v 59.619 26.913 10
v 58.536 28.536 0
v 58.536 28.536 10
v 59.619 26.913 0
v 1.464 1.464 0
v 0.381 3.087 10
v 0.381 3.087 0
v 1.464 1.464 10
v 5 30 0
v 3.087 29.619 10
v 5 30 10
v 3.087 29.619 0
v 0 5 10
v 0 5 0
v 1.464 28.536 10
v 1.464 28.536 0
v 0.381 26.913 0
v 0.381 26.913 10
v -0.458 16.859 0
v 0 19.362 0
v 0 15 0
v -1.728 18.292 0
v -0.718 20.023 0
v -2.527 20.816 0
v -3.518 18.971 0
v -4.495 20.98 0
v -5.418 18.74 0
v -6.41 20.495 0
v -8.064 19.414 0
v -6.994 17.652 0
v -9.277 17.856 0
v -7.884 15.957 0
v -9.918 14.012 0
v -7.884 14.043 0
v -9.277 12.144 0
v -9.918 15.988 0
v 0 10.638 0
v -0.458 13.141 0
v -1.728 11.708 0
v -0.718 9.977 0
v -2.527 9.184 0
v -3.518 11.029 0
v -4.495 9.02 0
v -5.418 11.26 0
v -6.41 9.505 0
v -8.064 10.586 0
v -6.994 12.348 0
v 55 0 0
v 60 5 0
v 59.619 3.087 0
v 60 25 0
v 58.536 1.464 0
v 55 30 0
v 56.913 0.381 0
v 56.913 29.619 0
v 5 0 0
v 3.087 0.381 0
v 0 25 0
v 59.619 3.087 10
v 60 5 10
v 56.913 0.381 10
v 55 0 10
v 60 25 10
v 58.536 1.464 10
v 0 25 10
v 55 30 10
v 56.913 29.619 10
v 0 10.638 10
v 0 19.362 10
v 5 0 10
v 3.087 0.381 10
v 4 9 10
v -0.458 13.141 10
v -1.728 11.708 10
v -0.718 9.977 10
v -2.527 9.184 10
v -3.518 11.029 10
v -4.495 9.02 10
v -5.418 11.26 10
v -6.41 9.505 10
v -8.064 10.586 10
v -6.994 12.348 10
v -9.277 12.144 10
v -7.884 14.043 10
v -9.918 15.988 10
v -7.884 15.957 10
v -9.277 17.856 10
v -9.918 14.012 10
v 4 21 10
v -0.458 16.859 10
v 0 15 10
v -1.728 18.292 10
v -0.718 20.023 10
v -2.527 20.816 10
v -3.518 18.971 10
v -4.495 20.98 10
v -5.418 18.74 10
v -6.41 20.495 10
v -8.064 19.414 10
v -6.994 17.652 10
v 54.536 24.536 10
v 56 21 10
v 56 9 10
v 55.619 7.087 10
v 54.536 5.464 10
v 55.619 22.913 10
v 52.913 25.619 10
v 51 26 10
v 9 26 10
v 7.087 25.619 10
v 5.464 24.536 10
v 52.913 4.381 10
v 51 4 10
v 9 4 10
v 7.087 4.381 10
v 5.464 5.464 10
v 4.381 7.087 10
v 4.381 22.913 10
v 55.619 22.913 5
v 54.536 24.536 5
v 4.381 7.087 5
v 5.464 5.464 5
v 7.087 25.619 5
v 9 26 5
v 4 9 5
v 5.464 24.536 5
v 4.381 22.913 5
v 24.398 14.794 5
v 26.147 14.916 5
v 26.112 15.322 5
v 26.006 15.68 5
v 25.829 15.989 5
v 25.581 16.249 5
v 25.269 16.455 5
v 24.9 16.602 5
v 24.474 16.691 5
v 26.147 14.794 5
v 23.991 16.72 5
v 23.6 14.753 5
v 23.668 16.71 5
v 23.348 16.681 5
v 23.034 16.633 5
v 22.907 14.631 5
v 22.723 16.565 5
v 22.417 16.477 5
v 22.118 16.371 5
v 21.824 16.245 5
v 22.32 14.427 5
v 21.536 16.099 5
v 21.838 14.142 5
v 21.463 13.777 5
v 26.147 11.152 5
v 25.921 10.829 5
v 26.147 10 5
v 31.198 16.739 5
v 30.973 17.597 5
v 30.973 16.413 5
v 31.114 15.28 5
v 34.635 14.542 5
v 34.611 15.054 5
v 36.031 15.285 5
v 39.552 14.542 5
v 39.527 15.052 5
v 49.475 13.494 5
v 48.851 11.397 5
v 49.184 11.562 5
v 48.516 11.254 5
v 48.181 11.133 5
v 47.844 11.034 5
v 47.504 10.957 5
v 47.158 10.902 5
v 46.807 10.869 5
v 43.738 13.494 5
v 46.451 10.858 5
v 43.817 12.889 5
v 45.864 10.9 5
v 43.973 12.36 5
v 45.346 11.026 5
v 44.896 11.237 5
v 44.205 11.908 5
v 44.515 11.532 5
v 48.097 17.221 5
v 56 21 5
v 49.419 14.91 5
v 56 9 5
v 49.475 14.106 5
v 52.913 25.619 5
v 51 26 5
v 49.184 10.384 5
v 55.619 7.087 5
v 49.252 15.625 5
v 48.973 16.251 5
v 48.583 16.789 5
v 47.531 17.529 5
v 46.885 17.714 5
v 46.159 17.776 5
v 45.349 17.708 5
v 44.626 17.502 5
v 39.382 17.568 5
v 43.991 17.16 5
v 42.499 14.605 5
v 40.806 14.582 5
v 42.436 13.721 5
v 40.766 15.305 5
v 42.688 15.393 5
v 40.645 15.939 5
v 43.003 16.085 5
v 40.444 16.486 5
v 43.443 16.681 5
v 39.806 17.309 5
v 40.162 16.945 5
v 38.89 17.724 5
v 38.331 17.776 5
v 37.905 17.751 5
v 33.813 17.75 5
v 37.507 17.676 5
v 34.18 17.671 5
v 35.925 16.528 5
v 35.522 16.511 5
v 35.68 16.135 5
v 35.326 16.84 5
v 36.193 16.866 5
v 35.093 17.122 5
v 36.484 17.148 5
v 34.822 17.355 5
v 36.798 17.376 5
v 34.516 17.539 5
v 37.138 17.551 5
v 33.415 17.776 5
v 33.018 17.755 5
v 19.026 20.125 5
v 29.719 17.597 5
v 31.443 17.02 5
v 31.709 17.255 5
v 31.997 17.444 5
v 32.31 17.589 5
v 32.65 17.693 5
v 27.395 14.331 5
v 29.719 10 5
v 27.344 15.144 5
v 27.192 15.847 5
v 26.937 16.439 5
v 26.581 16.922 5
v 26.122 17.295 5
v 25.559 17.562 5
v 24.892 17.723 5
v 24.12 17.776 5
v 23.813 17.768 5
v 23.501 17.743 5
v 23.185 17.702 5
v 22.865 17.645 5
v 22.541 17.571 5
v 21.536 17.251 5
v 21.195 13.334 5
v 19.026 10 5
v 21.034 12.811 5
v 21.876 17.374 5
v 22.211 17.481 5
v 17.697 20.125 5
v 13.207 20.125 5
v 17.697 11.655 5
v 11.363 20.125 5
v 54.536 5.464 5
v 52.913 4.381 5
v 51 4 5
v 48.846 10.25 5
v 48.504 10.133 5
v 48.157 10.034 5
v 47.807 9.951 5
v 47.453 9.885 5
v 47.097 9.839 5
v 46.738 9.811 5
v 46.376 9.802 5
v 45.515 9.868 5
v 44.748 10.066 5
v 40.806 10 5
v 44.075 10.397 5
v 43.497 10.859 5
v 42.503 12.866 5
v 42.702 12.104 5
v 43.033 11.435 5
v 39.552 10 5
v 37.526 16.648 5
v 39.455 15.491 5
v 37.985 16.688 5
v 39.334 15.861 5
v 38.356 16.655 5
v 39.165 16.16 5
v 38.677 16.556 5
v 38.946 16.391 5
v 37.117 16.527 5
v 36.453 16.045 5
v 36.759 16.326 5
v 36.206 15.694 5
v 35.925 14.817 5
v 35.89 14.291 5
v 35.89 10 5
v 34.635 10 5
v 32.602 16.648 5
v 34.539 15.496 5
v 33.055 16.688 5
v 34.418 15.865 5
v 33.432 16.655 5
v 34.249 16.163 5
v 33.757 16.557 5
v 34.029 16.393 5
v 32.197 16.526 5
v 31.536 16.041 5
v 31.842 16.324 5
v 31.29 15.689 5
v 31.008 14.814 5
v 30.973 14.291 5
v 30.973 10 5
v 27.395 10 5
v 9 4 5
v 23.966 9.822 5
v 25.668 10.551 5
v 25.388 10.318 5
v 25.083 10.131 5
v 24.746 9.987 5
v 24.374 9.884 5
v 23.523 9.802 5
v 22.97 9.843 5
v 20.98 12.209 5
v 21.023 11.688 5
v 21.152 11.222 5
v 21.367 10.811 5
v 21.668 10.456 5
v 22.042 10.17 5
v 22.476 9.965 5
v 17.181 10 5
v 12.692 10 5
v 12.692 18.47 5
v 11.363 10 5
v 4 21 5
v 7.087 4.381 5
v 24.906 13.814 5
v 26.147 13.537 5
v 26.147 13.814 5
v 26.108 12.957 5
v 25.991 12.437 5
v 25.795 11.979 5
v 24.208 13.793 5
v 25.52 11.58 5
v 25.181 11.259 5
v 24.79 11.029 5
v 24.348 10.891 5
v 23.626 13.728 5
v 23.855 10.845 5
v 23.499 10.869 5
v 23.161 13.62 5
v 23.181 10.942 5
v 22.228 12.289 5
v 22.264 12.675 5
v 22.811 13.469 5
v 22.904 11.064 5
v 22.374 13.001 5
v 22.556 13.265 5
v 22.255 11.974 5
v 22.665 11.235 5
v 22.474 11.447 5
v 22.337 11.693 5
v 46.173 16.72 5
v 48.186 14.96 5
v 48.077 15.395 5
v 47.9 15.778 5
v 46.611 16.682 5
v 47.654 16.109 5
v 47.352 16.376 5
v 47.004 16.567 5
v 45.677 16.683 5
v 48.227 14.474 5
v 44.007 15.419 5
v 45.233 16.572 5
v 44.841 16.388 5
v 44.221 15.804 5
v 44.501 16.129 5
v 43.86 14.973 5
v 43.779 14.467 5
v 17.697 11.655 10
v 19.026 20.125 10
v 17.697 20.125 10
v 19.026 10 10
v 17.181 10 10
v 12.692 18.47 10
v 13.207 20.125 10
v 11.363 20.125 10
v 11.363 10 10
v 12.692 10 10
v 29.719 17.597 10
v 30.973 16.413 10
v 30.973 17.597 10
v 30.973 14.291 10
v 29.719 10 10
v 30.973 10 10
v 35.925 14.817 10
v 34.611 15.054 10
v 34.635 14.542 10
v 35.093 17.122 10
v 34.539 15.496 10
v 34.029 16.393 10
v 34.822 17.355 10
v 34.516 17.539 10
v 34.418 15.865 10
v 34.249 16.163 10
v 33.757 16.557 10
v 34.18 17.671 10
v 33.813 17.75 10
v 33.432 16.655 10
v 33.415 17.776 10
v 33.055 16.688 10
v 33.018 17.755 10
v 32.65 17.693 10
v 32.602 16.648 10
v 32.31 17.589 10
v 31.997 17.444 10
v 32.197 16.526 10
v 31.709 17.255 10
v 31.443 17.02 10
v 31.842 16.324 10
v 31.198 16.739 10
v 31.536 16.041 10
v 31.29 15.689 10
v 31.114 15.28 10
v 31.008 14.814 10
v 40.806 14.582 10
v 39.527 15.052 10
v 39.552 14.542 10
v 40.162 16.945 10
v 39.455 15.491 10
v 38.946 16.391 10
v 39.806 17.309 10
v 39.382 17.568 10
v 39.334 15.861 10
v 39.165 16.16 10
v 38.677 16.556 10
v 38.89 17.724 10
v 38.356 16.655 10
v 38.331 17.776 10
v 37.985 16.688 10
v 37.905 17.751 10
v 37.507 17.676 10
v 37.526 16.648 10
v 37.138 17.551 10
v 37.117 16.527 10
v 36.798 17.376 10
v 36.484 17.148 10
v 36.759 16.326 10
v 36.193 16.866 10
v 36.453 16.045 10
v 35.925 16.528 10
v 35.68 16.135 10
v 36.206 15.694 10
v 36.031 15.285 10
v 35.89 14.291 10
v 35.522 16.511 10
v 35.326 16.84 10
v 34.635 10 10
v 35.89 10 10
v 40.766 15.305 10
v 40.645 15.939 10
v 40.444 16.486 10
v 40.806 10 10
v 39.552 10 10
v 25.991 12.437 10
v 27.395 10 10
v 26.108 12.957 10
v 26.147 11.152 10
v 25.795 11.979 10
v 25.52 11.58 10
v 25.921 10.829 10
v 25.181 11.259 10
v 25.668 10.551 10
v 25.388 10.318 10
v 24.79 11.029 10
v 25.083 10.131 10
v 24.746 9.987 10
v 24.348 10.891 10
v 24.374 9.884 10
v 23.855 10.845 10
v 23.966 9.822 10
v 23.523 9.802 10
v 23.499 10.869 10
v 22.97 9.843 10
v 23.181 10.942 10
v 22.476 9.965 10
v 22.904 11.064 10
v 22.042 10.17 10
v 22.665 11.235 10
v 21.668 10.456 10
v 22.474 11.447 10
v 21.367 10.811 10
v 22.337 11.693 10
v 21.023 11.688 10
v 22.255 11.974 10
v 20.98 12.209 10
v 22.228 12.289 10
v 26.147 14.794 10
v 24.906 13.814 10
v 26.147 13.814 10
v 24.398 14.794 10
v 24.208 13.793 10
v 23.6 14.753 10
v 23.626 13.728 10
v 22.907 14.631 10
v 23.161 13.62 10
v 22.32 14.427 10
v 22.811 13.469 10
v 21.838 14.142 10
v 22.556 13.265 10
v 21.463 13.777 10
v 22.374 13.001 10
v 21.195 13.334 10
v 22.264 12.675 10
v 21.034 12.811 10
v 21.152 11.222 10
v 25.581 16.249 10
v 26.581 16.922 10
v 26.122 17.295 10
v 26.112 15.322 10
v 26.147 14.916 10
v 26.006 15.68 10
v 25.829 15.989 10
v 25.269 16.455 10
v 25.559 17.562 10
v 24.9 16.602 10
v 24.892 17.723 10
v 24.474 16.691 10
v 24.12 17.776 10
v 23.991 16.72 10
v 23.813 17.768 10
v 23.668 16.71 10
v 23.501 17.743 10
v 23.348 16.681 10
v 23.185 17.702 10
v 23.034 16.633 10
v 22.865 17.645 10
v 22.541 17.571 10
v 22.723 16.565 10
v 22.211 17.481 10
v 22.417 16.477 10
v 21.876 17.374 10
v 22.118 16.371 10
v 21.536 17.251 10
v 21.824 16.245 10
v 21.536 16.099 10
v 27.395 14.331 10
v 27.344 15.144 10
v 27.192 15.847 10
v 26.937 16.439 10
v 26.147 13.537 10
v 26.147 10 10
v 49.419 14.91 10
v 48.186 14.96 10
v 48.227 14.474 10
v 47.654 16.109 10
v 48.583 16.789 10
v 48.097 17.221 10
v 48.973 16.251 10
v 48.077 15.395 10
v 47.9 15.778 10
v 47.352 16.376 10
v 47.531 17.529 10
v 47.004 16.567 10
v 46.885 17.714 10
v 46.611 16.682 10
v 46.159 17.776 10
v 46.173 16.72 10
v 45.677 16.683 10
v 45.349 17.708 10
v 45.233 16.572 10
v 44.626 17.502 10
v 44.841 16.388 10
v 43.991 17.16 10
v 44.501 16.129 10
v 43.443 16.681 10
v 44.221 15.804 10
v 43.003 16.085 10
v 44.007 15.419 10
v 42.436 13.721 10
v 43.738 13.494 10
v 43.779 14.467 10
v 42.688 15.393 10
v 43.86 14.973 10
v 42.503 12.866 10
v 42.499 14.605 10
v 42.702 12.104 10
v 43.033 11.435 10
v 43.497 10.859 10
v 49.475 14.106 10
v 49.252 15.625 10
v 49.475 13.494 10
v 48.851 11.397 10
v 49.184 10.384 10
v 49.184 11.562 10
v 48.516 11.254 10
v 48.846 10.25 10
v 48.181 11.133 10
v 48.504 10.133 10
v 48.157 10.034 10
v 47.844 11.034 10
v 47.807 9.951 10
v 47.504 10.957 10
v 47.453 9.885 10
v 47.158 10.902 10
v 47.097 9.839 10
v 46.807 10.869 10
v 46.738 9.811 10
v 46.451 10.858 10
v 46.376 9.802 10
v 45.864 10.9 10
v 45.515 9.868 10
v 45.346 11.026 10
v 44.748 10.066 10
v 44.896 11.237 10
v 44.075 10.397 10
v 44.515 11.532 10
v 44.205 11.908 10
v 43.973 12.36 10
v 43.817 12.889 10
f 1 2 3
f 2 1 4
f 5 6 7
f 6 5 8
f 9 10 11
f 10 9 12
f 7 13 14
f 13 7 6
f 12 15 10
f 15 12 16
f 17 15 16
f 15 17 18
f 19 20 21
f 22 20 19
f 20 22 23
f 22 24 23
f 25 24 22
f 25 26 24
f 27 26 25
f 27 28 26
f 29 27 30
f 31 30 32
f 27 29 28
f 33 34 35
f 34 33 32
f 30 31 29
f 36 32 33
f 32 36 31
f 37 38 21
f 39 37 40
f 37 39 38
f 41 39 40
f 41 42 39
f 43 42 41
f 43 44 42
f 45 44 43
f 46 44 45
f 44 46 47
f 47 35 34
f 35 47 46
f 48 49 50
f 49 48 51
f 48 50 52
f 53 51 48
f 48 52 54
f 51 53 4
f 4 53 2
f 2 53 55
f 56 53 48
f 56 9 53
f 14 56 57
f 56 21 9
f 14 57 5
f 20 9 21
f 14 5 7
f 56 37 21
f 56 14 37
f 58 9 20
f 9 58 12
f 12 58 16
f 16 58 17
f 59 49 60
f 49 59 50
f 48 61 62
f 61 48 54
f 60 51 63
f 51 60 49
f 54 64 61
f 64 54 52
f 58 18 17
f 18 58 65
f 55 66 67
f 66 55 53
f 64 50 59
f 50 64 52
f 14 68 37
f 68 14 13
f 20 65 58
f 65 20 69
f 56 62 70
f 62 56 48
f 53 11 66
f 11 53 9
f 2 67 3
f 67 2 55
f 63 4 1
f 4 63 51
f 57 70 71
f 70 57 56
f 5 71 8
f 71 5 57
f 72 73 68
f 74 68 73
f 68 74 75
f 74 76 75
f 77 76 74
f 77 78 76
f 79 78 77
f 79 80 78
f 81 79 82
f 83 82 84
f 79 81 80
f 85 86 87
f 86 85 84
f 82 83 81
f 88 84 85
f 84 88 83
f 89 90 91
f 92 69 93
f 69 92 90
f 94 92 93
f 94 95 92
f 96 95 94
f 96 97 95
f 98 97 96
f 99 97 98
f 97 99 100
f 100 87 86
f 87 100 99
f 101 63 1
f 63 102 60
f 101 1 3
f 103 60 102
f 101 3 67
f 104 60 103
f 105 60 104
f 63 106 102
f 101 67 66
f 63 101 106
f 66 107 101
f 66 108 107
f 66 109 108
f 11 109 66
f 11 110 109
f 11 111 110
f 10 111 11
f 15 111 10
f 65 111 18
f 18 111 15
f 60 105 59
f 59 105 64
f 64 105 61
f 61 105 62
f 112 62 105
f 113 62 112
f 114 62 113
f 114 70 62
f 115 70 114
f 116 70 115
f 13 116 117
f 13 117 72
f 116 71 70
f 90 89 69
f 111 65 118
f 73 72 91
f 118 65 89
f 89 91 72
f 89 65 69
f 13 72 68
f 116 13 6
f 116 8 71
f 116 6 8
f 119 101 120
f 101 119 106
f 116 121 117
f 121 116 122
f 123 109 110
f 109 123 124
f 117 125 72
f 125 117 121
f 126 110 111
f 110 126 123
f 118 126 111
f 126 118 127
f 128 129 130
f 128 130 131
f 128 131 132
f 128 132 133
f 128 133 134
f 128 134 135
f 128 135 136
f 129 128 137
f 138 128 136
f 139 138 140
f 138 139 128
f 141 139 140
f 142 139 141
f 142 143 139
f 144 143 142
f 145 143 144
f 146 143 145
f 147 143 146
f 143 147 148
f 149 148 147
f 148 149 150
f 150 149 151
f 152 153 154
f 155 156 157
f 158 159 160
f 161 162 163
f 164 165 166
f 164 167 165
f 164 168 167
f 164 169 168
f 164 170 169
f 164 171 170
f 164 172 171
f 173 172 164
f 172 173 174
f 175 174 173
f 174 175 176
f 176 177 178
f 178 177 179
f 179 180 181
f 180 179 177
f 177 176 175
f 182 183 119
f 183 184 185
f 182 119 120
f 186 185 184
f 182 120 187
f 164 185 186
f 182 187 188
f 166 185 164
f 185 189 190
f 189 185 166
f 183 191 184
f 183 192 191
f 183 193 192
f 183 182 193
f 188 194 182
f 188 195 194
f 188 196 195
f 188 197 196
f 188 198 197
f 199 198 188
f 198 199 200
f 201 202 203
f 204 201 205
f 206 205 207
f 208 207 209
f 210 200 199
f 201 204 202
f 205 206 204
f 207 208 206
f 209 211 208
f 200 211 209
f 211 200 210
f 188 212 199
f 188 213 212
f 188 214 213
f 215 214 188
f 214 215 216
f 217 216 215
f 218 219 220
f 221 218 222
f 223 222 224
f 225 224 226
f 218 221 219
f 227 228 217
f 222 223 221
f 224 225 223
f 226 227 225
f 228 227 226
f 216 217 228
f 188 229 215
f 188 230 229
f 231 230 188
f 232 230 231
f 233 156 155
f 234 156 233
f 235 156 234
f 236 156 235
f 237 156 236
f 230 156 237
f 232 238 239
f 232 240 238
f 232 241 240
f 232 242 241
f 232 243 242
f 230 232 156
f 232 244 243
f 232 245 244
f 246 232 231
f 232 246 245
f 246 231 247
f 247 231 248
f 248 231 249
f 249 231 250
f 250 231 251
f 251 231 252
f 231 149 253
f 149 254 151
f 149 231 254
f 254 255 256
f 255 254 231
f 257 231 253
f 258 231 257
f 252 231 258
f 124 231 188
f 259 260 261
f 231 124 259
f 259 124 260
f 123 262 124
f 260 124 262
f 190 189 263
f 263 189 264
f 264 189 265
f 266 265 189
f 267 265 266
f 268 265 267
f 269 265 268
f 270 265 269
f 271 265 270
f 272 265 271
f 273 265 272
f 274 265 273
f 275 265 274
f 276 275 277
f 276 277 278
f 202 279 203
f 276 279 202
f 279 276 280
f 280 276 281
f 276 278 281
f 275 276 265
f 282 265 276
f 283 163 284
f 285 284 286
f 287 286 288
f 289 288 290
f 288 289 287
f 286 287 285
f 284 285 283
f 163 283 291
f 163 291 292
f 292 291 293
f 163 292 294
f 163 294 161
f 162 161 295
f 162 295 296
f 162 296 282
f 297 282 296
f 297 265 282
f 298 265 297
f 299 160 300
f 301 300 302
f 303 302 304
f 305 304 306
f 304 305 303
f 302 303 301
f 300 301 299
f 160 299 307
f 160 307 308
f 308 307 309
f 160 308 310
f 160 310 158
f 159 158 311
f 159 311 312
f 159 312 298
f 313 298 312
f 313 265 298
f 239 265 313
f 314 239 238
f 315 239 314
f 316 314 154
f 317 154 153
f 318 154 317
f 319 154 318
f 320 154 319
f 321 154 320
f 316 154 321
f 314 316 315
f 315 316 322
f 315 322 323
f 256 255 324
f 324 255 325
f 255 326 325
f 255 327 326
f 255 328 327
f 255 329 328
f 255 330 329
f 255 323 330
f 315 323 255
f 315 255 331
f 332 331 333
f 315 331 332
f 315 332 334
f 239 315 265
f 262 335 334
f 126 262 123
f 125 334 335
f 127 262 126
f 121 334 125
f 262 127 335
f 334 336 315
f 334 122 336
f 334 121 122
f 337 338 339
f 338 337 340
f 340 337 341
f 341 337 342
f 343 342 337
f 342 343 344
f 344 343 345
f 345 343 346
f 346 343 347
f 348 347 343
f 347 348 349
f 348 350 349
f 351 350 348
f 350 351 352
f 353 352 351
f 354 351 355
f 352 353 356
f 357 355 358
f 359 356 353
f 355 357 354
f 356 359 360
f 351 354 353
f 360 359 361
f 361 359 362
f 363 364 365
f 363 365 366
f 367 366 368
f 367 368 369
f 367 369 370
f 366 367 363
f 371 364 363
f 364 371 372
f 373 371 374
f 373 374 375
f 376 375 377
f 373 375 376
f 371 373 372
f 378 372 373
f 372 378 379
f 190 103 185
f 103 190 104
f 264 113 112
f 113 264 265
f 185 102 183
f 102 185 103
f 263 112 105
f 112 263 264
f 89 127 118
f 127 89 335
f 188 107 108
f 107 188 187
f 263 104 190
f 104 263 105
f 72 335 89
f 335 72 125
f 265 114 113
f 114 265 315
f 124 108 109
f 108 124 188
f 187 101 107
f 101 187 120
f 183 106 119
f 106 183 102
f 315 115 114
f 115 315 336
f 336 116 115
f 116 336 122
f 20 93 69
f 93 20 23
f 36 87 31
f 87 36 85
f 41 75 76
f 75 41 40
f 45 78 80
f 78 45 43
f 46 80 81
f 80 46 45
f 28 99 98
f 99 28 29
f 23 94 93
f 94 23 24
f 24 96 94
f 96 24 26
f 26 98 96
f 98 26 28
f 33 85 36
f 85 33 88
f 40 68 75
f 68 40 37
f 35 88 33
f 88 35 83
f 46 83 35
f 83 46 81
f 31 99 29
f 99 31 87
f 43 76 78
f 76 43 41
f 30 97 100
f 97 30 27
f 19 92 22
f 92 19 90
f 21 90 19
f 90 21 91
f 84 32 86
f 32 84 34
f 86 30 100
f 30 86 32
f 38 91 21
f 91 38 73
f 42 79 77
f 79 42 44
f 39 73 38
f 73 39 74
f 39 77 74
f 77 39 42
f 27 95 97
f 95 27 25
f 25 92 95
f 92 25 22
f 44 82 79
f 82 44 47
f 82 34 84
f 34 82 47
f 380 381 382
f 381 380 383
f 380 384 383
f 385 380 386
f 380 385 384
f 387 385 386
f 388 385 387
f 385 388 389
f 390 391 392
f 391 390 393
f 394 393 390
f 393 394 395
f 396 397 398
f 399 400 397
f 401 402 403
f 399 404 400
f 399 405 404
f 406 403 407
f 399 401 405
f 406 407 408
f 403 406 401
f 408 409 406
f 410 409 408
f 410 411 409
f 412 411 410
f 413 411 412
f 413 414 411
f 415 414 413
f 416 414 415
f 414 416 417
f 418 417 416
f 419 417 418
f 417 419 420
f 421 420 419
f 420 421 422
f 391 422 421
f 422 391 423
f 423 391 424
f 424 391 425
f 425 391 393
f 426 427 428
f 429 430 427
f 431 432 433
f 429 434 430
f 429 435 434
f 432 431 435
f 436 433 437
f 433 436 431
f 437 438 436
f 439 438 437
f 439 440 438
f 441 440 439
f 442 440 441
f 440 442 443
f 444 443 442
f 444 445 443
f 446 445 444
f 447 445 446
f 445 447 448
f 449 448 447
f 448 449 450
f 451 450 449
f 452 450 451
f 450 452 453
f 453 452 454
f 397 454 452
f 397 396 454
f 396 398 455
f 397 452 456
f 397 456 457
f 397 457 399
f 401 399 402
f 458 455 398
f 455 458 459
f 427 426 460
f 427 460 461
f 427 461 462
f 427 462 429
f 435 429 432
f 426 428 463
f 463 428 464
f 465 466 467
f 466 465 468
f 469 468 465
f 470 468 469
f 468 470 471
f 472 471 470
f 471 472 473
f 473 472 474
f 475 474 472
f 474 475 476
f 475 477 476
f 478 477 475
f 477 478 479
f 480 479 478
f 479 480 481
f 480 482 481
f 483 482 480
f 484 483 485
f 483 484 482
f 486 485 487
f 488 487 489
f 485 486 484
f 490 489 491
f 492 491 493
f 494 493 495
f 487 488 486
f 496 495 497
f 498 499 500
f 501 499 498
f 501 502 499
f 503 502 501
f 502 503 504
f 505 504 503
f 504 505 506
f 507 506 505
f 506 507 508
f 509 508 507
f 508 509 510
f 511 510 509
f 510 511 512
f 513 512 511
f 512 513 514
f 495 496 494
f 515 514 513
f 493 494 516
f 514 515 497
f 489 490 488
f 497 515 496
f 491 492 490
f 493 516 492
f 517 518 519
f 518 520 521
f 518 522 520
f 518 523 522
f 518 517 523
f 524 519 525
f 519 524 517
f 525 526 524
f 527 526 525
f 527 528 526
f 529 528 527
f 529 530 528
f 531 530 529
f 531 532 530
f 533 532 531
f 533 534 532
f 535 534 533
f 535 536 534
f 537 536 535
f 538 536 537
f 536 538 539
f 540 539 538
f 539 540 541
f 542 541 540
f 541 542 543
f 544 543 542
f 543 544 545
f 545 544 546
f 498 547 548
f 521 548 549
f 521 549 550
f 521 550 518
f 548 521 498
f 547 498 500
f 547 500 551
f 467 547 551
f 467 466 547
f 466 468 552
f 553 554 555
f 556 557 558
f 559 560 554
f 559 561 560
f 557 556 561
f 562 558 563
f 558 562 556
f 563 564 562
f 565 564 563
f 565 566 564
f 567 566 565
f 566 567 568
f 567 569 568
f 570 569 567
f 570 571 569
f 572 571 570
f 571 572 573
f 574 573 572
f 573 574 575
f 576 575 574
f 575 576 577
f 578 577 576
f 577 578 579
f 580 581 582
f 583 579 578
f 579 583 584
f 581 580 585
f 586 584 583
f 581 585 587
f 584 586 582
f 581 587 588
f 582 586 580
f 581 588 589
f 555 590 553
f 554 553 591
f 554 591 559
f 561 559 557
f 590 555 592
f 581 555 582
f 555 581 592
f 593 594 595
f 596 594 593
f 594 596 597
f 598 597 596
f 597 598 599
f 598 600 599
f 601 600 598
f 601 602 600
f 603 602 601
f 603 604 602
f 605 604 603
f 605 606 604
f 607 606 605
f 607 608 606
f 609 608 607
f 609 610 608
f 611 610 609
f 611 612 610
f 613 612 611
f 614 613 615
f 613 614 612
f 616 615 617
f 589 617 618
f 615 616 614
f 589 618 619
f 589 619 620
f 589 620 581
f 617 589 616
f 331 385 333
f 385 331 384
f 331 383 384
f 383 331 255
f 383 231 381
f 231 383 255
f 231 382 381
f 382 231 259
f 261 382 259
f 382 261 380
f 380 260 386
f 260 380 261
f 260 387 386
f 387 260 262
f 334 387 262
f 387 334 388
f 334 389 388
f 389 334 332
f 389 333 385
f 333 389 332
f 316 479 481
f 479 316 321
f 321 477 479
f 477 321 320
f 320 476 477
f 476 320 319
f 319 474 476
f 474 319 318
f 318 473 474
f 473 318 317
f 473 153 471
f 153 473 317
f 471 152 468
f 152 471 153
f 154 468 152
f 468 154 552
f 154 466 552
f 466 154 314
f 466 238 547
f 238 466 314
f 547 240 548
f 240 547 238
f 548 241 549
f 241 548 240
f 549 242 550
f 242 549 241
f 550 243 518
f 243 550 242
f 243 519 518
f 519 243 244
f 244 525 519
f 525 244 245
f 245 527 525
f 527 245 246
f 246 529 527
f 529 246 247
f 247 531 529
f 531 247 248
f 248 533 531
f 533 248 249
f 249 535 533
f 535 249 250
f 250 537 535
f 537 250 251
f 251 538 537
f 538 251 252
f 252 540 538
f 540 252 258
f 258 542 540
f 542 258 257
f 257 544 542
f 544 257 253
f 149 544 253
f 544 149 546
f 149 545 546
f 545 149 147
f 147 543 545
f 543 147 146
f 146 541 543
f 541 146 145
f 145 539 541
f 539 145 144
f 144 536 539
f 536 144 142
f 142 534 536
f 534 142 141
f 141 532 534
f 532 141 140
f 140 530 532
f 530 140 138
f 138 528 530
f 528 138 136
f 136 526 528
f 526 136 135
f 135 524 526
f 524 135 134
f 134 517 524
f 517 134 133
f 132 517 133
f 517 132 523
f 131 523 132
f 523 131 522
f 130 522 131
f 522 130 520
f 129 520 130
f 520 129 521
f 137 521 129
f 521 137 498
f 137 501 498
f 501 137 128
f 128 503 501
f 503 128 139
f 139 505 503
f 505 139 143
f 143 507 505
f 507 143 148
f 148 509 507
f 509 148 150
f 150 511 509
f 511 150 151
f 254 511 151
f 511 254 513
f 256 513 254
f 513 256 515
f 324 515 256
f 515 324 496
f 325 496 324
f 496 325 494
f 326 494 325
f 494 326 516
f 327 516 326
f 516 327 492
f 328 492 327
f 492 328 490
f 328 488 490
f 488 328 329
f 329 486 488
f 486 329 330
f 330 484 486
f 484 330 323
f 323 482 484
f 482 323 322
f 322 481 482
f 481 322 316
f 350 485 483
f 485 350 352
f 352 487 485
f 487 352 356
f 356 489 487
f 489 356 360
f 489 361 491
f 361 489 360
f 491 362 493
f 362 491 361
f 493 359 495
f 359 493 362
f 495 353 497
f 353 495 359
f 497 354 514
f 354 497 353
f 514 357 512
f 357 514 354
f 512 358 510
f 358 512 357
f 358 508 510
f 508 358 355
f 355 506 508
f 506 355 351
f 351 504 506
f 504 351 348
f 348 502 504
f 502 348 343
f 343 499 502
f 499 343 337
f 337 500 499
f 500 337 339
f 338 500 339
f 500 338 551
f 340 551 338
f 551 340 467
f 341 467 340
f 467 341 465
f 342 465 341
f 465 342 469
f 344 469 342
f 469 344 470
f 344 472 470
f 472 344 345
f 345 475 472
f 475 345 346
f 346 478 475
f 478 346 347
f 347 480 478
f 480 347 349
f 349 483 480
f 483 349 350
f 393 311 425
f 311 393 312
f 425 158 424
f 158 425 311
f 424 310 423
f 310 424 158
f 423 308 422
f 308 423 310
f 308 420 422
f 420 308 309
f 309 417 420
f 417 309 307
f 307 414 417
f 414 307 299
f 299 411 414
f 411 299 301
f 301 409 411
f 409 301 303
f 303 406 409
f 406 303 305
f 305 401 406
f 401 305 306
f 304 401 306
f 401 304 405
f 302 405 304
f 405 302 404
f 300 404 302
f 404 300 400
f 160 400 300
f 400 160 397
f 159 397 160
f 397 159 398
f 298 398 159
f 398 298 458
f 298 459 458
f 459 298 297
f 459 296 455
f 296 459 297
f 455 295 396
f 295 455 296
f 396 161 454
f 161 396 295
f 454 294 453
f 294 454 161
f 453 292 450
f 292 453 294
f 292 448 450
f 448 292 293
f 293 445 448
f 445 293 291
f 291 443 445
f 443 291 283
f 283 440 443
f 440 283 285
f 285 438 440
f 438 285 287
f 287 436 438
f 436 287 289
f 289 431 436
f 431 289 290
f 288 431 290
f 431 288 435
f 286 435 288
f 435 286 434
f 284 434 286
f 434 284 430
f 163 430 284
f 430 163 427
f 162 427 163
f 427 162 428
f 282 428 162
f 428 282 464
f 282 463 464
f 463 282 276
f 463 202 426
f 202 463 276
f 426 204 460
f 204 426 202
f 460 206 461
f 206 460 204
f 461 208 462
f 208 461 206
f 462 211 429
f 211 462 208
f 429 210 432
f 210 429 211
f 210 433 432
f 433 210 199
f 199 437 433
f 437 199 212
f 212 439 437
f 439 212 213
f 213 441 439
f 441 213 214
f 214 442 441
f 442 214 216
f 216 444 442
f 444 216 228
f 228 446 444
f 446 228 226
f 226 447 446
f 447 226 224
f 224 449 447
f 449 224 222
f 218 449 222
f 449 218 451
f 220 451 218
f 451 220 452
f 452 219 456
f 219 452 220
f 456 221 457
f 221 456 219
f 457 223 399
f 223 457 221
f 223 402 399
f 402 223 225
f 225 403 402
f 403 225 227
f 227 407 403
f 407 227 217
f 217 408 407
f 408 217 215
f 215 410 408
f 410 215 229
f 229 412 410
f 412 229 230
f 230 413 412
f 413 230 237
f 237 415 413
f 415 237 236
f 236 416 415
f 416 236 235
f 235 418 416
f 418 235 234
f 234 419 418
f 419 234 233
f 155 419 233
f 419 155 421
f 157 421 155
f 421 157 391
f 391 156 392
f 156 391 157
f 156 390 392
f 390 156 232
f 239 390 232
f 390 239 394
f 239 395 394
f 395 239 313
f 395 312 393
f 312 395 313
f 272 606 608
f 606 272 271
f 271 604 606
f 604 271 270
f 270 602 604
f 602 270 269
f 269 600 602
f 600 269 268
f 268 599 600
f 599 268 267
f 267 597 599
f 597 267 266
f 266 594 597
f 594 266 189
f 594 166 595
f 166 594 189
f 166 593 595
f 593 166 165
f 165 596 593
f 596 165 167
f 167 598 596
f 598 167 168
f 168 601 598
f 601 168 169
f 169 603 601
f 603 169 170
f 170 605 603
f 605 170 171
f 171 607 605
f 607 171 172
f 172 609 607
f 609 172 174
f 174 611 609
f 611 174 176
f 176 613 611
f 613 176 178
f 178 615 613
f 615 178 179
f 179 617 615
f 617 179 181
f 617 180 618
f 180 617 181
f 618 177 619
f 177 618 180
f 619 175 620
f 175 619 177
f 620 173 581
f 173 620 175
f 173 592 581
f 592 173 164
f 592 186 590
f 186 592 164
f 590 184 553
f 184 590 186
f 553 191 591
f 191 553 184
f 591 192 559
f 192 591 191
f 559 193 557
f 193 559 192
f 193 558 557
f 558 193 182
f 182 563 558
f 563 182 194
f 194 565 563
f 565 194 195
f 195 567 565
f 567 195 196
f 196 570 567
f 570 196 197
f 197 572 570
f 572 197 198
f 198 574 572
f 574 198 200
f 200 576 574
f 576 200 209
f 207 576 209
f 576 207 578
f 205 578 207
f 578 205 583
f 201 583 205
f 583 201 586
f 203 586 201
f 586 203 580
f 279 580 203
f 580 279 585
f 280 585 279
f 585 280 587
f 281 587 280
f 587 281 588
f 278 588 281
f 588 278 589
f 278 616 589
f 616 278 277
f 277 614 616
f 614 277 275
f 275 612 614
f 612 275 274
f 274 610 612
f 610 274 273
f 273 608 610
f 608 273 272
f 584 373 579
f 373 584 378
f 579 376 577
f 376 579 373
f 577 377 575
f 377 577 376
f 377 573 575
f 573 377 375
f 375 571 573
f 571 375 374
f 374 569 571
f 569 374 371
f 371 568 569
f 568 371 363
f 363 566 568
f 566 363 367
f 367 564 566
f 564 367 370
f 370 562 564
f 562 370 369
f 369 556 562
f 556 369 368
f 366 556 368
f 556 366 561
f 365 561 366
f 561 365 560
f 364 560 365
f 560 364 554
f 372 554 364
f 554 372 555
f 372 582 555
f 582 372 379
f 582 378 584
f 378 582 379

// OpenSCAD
name="Name";
// font name
font_name = "Courgette"; // [Gloria Hallelujah, Pacifico, Courgette, Permanent Marker, Domine:Domine bold, Ultra, Bevan]

// Manually set length to match name
length=50;
width=20;
height=10;

l=length; w=width; h=height;

translate([10,10,0])
linear_extrude(height)
text(name, font = font_name);



difference()
{
  face(l,w,h);
  translate([4,4,h/2]) face(l-8,w-8,h/2+1);
}

translate([-4,15,0]) difference()
{
  cylinder(h,6,6,0);
  cylinder(h+1,4,4,0);
}

module face(l, w, h)
{
    linear_extrude(h)
    translate([5,5,0])
    hull()
    {
      circle(5);
      translate([l,0,0]) circle(5);
      translate([0,w,0]) circle(5);
      translate([l,w,0]) circle(5);
    }
}
